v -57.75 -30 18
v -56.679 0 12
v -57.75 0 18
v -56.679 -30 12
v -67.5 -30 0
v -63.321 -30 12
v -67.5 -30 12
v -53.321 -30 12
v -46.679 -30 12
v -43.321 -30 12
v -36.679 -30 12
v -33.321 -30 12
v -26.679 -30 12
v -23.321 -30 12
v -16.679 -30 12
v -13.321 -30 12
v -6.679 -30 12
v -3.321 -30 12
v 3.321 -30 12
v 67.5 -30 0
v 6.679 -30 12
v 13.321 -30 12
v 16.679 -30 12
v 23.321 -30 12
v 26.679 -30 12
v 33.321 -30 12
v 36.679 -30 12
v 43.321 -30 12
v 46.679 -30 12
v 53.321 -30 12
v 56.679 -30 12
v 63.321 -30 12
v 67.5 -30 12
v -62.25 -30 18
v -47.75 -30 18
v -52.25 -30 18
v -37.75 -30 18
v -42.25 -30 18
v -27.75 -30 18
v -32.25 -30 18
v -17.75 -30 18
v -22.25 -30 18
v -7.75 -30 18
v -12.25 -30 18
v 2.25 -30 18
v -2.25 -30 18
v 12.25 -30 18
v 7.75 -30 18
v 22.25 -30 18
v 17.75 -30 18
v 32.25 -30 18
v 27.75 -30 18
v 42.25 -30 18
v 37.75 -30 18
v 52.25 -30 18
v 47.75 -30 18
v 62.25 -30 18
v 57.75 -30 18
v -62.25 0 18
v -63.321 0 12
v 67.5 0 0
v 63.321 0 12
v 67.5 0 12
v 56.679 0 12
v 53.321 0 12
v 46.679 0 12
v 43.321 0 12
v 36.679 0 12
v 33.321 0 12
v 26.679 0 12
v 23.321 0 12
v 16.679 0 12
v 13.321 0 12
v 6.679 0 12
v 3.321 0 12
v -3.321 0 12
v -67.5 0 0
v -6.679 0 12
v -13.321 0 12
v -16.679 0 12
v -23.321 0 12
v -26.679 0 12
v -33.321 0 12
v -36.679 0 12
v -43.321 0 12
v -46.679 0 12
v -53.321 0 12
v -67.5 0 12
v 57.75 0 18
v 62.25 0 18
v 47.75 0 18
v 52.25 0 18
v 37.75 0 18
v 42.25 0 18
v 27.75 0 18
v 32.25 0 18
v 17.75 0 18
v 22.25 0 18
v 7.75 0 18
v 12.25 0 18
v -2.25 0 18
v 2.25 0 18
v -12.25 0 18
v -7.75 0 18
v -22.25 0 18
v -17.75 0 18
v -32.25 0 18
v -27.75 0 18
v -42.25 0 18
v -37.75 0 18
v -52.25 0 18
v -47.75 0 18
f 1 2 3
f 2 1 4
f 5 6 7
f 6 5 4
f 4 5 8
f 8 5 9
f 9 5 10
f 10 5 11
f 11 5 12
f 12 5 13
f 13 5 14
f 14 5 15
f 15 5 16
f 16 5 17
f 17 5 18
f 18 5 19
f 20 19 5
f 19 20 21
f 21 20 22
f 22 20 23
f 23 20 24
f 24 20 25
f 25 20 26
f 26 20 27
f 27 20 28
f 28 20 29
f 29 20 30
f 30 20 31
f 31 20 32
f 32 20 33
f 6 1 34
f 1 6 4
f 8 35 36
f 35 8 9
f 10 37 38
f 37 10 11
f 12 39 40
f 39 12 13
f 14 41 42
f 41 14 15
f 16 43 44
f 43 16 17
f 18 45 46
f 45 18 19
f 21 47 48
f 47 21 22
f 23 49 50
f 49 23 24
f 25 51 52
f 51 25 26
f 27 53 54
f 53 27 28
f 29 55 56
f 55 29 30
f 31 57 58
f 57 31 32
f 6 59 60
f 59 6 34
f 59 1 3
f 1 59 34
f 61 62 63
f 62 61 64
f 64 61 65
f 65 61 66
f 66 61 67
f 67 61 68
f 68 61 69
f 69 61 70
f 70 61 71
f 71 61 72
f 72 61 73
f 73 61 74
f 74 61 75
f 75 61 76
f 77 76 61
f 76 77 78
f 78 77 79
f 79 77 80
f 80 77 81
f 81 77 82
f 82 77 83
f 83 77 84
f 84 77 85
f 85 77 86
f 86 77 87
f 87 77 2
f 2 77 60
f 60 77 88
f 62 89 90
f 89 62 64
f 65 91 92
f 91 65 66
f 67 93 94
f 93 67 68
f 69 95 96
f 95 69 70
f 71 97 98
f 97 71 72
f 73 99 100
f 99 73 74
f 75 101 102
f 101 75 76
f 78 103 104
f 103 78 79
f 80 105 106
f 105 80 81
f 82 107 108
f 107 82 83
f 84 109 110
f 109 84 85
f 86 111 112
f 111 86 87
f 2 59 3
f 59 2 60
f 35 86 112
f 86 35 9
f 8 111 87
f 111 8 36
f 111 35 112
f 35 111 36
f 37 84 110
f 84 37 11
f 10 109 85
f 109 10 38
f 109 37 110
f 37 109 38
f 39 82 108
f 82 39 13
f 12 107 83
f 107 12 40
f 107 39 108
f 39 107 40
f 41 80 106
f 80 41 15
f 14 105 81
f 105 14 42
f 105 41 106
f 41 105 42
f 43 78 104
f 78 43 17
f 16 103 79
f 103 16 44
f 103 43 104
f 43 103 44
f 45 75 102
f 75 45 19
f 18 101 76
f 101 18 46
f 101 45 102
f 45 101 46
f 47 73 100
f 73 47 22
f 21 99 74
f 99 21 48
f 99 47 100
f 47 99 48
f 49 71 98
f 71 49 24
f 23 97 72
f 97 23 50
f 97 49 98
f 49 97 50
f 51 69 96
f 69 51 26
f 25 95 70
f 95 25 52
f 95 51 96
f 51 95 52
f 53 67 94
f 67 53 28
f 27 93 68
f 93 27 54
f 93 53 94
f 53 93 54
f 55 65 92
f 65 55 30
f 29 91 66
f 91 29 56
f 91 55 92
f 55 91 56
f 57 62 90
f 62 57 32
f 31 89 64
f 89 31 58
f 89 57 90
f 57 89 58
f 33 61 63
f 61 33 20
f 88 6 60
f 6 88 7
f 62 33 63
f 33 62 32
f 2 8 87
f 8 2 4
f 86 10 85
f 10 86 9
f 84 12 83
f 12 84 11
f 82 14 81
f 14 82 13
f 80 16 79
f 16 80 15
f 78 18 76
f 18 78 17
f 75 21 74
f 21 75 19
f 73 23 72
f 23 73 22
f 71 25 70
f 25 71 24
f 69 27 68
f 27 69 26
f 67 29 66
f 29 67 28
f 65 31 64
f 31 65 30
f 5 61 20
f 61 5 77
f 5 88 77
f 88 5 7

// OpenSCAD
$fn = 32;

// ----------------------------------------------------------------------
// Toothed rack, 13 teeth
// 10 mm pitch, 6 mm teeth
// ----------------------------------------------------------------------

// --- parameters (mm) ---
bar_w = 30;     // bar width (Y)
bar_h = 12;     // bar height (Z)
teeth = 13;     // number of teeth
pitch = 10;     // tooth pitch
tooth_h = 6;    // tooth height above the bar
root_w = 7;     // tooth width at the root
crest_w = 4.5;  // tooth width at the crest

// --- derived feature positions (mm) ---
span = (teeth - 1) * pitch;  // = 120   distance between the outer teeth
bar_l = span + root_w + 8;   // = 135   bar length: teeth plus 4 mm at each end
tooth_x = -span / 2;         // = -60   X of the first tooth
height = bar_h + tooth_h;    // = 18   overall height
feature_centers = [
  [tooth_x + 0 * pitch, -bar_w / 2],
  [tooth_x + 1 * pitch, -bar_w / 2],
  [tooth_x + 2 * pitch, -bar_w / 2],
  [tooth_x + 3 * pitch, -bar_w / 2],
  [tooth_x + 4 * pitch, -bar_w / 2],
  [tooth_x + 5 * pitch, -bar_w / 2],
  [tooth_x + 6 * pitch, -bar_w / 2],
  [tooth_x + 7 * pitch, -bar_w / 2],
  [tooth_x + 8 * pitch, -bar_w / 2],
  [tooth_x + 9 * pitch, -bar_w / 2],
  [tooth_x + 10 * pitch, -bar_w / 2],
  [tooth_x + 11 * pitch, -bar_w / 2],
  [tooth_x + 12 * pitch, -bar_w / 2]
];   // tooth centre line, drives the tooth loop

// bar with a rack of teeth, one extruded trapezoium per centre
module rack_tooth() {
  linear_extrude(height = bar_w)
    polygon(points = [
      [0, 0],
      [root_w, 0],
      [root_w / 2 + crest_w / 2, tooth_h + 1],
      [root_w / 2 - crest_w / 2, tooth_h + 1]
    ]);
}

union() {
  translate([-bar_l / 2, -bar_w, 0]) cube([bar_l, bar_w, bar_h]);
  for (centre = feature_centers)
    translate([centre[0] - root_w / 2, 0, bar_h - 1]) rotate([90, 0, 0]) rack_tooth();
}
